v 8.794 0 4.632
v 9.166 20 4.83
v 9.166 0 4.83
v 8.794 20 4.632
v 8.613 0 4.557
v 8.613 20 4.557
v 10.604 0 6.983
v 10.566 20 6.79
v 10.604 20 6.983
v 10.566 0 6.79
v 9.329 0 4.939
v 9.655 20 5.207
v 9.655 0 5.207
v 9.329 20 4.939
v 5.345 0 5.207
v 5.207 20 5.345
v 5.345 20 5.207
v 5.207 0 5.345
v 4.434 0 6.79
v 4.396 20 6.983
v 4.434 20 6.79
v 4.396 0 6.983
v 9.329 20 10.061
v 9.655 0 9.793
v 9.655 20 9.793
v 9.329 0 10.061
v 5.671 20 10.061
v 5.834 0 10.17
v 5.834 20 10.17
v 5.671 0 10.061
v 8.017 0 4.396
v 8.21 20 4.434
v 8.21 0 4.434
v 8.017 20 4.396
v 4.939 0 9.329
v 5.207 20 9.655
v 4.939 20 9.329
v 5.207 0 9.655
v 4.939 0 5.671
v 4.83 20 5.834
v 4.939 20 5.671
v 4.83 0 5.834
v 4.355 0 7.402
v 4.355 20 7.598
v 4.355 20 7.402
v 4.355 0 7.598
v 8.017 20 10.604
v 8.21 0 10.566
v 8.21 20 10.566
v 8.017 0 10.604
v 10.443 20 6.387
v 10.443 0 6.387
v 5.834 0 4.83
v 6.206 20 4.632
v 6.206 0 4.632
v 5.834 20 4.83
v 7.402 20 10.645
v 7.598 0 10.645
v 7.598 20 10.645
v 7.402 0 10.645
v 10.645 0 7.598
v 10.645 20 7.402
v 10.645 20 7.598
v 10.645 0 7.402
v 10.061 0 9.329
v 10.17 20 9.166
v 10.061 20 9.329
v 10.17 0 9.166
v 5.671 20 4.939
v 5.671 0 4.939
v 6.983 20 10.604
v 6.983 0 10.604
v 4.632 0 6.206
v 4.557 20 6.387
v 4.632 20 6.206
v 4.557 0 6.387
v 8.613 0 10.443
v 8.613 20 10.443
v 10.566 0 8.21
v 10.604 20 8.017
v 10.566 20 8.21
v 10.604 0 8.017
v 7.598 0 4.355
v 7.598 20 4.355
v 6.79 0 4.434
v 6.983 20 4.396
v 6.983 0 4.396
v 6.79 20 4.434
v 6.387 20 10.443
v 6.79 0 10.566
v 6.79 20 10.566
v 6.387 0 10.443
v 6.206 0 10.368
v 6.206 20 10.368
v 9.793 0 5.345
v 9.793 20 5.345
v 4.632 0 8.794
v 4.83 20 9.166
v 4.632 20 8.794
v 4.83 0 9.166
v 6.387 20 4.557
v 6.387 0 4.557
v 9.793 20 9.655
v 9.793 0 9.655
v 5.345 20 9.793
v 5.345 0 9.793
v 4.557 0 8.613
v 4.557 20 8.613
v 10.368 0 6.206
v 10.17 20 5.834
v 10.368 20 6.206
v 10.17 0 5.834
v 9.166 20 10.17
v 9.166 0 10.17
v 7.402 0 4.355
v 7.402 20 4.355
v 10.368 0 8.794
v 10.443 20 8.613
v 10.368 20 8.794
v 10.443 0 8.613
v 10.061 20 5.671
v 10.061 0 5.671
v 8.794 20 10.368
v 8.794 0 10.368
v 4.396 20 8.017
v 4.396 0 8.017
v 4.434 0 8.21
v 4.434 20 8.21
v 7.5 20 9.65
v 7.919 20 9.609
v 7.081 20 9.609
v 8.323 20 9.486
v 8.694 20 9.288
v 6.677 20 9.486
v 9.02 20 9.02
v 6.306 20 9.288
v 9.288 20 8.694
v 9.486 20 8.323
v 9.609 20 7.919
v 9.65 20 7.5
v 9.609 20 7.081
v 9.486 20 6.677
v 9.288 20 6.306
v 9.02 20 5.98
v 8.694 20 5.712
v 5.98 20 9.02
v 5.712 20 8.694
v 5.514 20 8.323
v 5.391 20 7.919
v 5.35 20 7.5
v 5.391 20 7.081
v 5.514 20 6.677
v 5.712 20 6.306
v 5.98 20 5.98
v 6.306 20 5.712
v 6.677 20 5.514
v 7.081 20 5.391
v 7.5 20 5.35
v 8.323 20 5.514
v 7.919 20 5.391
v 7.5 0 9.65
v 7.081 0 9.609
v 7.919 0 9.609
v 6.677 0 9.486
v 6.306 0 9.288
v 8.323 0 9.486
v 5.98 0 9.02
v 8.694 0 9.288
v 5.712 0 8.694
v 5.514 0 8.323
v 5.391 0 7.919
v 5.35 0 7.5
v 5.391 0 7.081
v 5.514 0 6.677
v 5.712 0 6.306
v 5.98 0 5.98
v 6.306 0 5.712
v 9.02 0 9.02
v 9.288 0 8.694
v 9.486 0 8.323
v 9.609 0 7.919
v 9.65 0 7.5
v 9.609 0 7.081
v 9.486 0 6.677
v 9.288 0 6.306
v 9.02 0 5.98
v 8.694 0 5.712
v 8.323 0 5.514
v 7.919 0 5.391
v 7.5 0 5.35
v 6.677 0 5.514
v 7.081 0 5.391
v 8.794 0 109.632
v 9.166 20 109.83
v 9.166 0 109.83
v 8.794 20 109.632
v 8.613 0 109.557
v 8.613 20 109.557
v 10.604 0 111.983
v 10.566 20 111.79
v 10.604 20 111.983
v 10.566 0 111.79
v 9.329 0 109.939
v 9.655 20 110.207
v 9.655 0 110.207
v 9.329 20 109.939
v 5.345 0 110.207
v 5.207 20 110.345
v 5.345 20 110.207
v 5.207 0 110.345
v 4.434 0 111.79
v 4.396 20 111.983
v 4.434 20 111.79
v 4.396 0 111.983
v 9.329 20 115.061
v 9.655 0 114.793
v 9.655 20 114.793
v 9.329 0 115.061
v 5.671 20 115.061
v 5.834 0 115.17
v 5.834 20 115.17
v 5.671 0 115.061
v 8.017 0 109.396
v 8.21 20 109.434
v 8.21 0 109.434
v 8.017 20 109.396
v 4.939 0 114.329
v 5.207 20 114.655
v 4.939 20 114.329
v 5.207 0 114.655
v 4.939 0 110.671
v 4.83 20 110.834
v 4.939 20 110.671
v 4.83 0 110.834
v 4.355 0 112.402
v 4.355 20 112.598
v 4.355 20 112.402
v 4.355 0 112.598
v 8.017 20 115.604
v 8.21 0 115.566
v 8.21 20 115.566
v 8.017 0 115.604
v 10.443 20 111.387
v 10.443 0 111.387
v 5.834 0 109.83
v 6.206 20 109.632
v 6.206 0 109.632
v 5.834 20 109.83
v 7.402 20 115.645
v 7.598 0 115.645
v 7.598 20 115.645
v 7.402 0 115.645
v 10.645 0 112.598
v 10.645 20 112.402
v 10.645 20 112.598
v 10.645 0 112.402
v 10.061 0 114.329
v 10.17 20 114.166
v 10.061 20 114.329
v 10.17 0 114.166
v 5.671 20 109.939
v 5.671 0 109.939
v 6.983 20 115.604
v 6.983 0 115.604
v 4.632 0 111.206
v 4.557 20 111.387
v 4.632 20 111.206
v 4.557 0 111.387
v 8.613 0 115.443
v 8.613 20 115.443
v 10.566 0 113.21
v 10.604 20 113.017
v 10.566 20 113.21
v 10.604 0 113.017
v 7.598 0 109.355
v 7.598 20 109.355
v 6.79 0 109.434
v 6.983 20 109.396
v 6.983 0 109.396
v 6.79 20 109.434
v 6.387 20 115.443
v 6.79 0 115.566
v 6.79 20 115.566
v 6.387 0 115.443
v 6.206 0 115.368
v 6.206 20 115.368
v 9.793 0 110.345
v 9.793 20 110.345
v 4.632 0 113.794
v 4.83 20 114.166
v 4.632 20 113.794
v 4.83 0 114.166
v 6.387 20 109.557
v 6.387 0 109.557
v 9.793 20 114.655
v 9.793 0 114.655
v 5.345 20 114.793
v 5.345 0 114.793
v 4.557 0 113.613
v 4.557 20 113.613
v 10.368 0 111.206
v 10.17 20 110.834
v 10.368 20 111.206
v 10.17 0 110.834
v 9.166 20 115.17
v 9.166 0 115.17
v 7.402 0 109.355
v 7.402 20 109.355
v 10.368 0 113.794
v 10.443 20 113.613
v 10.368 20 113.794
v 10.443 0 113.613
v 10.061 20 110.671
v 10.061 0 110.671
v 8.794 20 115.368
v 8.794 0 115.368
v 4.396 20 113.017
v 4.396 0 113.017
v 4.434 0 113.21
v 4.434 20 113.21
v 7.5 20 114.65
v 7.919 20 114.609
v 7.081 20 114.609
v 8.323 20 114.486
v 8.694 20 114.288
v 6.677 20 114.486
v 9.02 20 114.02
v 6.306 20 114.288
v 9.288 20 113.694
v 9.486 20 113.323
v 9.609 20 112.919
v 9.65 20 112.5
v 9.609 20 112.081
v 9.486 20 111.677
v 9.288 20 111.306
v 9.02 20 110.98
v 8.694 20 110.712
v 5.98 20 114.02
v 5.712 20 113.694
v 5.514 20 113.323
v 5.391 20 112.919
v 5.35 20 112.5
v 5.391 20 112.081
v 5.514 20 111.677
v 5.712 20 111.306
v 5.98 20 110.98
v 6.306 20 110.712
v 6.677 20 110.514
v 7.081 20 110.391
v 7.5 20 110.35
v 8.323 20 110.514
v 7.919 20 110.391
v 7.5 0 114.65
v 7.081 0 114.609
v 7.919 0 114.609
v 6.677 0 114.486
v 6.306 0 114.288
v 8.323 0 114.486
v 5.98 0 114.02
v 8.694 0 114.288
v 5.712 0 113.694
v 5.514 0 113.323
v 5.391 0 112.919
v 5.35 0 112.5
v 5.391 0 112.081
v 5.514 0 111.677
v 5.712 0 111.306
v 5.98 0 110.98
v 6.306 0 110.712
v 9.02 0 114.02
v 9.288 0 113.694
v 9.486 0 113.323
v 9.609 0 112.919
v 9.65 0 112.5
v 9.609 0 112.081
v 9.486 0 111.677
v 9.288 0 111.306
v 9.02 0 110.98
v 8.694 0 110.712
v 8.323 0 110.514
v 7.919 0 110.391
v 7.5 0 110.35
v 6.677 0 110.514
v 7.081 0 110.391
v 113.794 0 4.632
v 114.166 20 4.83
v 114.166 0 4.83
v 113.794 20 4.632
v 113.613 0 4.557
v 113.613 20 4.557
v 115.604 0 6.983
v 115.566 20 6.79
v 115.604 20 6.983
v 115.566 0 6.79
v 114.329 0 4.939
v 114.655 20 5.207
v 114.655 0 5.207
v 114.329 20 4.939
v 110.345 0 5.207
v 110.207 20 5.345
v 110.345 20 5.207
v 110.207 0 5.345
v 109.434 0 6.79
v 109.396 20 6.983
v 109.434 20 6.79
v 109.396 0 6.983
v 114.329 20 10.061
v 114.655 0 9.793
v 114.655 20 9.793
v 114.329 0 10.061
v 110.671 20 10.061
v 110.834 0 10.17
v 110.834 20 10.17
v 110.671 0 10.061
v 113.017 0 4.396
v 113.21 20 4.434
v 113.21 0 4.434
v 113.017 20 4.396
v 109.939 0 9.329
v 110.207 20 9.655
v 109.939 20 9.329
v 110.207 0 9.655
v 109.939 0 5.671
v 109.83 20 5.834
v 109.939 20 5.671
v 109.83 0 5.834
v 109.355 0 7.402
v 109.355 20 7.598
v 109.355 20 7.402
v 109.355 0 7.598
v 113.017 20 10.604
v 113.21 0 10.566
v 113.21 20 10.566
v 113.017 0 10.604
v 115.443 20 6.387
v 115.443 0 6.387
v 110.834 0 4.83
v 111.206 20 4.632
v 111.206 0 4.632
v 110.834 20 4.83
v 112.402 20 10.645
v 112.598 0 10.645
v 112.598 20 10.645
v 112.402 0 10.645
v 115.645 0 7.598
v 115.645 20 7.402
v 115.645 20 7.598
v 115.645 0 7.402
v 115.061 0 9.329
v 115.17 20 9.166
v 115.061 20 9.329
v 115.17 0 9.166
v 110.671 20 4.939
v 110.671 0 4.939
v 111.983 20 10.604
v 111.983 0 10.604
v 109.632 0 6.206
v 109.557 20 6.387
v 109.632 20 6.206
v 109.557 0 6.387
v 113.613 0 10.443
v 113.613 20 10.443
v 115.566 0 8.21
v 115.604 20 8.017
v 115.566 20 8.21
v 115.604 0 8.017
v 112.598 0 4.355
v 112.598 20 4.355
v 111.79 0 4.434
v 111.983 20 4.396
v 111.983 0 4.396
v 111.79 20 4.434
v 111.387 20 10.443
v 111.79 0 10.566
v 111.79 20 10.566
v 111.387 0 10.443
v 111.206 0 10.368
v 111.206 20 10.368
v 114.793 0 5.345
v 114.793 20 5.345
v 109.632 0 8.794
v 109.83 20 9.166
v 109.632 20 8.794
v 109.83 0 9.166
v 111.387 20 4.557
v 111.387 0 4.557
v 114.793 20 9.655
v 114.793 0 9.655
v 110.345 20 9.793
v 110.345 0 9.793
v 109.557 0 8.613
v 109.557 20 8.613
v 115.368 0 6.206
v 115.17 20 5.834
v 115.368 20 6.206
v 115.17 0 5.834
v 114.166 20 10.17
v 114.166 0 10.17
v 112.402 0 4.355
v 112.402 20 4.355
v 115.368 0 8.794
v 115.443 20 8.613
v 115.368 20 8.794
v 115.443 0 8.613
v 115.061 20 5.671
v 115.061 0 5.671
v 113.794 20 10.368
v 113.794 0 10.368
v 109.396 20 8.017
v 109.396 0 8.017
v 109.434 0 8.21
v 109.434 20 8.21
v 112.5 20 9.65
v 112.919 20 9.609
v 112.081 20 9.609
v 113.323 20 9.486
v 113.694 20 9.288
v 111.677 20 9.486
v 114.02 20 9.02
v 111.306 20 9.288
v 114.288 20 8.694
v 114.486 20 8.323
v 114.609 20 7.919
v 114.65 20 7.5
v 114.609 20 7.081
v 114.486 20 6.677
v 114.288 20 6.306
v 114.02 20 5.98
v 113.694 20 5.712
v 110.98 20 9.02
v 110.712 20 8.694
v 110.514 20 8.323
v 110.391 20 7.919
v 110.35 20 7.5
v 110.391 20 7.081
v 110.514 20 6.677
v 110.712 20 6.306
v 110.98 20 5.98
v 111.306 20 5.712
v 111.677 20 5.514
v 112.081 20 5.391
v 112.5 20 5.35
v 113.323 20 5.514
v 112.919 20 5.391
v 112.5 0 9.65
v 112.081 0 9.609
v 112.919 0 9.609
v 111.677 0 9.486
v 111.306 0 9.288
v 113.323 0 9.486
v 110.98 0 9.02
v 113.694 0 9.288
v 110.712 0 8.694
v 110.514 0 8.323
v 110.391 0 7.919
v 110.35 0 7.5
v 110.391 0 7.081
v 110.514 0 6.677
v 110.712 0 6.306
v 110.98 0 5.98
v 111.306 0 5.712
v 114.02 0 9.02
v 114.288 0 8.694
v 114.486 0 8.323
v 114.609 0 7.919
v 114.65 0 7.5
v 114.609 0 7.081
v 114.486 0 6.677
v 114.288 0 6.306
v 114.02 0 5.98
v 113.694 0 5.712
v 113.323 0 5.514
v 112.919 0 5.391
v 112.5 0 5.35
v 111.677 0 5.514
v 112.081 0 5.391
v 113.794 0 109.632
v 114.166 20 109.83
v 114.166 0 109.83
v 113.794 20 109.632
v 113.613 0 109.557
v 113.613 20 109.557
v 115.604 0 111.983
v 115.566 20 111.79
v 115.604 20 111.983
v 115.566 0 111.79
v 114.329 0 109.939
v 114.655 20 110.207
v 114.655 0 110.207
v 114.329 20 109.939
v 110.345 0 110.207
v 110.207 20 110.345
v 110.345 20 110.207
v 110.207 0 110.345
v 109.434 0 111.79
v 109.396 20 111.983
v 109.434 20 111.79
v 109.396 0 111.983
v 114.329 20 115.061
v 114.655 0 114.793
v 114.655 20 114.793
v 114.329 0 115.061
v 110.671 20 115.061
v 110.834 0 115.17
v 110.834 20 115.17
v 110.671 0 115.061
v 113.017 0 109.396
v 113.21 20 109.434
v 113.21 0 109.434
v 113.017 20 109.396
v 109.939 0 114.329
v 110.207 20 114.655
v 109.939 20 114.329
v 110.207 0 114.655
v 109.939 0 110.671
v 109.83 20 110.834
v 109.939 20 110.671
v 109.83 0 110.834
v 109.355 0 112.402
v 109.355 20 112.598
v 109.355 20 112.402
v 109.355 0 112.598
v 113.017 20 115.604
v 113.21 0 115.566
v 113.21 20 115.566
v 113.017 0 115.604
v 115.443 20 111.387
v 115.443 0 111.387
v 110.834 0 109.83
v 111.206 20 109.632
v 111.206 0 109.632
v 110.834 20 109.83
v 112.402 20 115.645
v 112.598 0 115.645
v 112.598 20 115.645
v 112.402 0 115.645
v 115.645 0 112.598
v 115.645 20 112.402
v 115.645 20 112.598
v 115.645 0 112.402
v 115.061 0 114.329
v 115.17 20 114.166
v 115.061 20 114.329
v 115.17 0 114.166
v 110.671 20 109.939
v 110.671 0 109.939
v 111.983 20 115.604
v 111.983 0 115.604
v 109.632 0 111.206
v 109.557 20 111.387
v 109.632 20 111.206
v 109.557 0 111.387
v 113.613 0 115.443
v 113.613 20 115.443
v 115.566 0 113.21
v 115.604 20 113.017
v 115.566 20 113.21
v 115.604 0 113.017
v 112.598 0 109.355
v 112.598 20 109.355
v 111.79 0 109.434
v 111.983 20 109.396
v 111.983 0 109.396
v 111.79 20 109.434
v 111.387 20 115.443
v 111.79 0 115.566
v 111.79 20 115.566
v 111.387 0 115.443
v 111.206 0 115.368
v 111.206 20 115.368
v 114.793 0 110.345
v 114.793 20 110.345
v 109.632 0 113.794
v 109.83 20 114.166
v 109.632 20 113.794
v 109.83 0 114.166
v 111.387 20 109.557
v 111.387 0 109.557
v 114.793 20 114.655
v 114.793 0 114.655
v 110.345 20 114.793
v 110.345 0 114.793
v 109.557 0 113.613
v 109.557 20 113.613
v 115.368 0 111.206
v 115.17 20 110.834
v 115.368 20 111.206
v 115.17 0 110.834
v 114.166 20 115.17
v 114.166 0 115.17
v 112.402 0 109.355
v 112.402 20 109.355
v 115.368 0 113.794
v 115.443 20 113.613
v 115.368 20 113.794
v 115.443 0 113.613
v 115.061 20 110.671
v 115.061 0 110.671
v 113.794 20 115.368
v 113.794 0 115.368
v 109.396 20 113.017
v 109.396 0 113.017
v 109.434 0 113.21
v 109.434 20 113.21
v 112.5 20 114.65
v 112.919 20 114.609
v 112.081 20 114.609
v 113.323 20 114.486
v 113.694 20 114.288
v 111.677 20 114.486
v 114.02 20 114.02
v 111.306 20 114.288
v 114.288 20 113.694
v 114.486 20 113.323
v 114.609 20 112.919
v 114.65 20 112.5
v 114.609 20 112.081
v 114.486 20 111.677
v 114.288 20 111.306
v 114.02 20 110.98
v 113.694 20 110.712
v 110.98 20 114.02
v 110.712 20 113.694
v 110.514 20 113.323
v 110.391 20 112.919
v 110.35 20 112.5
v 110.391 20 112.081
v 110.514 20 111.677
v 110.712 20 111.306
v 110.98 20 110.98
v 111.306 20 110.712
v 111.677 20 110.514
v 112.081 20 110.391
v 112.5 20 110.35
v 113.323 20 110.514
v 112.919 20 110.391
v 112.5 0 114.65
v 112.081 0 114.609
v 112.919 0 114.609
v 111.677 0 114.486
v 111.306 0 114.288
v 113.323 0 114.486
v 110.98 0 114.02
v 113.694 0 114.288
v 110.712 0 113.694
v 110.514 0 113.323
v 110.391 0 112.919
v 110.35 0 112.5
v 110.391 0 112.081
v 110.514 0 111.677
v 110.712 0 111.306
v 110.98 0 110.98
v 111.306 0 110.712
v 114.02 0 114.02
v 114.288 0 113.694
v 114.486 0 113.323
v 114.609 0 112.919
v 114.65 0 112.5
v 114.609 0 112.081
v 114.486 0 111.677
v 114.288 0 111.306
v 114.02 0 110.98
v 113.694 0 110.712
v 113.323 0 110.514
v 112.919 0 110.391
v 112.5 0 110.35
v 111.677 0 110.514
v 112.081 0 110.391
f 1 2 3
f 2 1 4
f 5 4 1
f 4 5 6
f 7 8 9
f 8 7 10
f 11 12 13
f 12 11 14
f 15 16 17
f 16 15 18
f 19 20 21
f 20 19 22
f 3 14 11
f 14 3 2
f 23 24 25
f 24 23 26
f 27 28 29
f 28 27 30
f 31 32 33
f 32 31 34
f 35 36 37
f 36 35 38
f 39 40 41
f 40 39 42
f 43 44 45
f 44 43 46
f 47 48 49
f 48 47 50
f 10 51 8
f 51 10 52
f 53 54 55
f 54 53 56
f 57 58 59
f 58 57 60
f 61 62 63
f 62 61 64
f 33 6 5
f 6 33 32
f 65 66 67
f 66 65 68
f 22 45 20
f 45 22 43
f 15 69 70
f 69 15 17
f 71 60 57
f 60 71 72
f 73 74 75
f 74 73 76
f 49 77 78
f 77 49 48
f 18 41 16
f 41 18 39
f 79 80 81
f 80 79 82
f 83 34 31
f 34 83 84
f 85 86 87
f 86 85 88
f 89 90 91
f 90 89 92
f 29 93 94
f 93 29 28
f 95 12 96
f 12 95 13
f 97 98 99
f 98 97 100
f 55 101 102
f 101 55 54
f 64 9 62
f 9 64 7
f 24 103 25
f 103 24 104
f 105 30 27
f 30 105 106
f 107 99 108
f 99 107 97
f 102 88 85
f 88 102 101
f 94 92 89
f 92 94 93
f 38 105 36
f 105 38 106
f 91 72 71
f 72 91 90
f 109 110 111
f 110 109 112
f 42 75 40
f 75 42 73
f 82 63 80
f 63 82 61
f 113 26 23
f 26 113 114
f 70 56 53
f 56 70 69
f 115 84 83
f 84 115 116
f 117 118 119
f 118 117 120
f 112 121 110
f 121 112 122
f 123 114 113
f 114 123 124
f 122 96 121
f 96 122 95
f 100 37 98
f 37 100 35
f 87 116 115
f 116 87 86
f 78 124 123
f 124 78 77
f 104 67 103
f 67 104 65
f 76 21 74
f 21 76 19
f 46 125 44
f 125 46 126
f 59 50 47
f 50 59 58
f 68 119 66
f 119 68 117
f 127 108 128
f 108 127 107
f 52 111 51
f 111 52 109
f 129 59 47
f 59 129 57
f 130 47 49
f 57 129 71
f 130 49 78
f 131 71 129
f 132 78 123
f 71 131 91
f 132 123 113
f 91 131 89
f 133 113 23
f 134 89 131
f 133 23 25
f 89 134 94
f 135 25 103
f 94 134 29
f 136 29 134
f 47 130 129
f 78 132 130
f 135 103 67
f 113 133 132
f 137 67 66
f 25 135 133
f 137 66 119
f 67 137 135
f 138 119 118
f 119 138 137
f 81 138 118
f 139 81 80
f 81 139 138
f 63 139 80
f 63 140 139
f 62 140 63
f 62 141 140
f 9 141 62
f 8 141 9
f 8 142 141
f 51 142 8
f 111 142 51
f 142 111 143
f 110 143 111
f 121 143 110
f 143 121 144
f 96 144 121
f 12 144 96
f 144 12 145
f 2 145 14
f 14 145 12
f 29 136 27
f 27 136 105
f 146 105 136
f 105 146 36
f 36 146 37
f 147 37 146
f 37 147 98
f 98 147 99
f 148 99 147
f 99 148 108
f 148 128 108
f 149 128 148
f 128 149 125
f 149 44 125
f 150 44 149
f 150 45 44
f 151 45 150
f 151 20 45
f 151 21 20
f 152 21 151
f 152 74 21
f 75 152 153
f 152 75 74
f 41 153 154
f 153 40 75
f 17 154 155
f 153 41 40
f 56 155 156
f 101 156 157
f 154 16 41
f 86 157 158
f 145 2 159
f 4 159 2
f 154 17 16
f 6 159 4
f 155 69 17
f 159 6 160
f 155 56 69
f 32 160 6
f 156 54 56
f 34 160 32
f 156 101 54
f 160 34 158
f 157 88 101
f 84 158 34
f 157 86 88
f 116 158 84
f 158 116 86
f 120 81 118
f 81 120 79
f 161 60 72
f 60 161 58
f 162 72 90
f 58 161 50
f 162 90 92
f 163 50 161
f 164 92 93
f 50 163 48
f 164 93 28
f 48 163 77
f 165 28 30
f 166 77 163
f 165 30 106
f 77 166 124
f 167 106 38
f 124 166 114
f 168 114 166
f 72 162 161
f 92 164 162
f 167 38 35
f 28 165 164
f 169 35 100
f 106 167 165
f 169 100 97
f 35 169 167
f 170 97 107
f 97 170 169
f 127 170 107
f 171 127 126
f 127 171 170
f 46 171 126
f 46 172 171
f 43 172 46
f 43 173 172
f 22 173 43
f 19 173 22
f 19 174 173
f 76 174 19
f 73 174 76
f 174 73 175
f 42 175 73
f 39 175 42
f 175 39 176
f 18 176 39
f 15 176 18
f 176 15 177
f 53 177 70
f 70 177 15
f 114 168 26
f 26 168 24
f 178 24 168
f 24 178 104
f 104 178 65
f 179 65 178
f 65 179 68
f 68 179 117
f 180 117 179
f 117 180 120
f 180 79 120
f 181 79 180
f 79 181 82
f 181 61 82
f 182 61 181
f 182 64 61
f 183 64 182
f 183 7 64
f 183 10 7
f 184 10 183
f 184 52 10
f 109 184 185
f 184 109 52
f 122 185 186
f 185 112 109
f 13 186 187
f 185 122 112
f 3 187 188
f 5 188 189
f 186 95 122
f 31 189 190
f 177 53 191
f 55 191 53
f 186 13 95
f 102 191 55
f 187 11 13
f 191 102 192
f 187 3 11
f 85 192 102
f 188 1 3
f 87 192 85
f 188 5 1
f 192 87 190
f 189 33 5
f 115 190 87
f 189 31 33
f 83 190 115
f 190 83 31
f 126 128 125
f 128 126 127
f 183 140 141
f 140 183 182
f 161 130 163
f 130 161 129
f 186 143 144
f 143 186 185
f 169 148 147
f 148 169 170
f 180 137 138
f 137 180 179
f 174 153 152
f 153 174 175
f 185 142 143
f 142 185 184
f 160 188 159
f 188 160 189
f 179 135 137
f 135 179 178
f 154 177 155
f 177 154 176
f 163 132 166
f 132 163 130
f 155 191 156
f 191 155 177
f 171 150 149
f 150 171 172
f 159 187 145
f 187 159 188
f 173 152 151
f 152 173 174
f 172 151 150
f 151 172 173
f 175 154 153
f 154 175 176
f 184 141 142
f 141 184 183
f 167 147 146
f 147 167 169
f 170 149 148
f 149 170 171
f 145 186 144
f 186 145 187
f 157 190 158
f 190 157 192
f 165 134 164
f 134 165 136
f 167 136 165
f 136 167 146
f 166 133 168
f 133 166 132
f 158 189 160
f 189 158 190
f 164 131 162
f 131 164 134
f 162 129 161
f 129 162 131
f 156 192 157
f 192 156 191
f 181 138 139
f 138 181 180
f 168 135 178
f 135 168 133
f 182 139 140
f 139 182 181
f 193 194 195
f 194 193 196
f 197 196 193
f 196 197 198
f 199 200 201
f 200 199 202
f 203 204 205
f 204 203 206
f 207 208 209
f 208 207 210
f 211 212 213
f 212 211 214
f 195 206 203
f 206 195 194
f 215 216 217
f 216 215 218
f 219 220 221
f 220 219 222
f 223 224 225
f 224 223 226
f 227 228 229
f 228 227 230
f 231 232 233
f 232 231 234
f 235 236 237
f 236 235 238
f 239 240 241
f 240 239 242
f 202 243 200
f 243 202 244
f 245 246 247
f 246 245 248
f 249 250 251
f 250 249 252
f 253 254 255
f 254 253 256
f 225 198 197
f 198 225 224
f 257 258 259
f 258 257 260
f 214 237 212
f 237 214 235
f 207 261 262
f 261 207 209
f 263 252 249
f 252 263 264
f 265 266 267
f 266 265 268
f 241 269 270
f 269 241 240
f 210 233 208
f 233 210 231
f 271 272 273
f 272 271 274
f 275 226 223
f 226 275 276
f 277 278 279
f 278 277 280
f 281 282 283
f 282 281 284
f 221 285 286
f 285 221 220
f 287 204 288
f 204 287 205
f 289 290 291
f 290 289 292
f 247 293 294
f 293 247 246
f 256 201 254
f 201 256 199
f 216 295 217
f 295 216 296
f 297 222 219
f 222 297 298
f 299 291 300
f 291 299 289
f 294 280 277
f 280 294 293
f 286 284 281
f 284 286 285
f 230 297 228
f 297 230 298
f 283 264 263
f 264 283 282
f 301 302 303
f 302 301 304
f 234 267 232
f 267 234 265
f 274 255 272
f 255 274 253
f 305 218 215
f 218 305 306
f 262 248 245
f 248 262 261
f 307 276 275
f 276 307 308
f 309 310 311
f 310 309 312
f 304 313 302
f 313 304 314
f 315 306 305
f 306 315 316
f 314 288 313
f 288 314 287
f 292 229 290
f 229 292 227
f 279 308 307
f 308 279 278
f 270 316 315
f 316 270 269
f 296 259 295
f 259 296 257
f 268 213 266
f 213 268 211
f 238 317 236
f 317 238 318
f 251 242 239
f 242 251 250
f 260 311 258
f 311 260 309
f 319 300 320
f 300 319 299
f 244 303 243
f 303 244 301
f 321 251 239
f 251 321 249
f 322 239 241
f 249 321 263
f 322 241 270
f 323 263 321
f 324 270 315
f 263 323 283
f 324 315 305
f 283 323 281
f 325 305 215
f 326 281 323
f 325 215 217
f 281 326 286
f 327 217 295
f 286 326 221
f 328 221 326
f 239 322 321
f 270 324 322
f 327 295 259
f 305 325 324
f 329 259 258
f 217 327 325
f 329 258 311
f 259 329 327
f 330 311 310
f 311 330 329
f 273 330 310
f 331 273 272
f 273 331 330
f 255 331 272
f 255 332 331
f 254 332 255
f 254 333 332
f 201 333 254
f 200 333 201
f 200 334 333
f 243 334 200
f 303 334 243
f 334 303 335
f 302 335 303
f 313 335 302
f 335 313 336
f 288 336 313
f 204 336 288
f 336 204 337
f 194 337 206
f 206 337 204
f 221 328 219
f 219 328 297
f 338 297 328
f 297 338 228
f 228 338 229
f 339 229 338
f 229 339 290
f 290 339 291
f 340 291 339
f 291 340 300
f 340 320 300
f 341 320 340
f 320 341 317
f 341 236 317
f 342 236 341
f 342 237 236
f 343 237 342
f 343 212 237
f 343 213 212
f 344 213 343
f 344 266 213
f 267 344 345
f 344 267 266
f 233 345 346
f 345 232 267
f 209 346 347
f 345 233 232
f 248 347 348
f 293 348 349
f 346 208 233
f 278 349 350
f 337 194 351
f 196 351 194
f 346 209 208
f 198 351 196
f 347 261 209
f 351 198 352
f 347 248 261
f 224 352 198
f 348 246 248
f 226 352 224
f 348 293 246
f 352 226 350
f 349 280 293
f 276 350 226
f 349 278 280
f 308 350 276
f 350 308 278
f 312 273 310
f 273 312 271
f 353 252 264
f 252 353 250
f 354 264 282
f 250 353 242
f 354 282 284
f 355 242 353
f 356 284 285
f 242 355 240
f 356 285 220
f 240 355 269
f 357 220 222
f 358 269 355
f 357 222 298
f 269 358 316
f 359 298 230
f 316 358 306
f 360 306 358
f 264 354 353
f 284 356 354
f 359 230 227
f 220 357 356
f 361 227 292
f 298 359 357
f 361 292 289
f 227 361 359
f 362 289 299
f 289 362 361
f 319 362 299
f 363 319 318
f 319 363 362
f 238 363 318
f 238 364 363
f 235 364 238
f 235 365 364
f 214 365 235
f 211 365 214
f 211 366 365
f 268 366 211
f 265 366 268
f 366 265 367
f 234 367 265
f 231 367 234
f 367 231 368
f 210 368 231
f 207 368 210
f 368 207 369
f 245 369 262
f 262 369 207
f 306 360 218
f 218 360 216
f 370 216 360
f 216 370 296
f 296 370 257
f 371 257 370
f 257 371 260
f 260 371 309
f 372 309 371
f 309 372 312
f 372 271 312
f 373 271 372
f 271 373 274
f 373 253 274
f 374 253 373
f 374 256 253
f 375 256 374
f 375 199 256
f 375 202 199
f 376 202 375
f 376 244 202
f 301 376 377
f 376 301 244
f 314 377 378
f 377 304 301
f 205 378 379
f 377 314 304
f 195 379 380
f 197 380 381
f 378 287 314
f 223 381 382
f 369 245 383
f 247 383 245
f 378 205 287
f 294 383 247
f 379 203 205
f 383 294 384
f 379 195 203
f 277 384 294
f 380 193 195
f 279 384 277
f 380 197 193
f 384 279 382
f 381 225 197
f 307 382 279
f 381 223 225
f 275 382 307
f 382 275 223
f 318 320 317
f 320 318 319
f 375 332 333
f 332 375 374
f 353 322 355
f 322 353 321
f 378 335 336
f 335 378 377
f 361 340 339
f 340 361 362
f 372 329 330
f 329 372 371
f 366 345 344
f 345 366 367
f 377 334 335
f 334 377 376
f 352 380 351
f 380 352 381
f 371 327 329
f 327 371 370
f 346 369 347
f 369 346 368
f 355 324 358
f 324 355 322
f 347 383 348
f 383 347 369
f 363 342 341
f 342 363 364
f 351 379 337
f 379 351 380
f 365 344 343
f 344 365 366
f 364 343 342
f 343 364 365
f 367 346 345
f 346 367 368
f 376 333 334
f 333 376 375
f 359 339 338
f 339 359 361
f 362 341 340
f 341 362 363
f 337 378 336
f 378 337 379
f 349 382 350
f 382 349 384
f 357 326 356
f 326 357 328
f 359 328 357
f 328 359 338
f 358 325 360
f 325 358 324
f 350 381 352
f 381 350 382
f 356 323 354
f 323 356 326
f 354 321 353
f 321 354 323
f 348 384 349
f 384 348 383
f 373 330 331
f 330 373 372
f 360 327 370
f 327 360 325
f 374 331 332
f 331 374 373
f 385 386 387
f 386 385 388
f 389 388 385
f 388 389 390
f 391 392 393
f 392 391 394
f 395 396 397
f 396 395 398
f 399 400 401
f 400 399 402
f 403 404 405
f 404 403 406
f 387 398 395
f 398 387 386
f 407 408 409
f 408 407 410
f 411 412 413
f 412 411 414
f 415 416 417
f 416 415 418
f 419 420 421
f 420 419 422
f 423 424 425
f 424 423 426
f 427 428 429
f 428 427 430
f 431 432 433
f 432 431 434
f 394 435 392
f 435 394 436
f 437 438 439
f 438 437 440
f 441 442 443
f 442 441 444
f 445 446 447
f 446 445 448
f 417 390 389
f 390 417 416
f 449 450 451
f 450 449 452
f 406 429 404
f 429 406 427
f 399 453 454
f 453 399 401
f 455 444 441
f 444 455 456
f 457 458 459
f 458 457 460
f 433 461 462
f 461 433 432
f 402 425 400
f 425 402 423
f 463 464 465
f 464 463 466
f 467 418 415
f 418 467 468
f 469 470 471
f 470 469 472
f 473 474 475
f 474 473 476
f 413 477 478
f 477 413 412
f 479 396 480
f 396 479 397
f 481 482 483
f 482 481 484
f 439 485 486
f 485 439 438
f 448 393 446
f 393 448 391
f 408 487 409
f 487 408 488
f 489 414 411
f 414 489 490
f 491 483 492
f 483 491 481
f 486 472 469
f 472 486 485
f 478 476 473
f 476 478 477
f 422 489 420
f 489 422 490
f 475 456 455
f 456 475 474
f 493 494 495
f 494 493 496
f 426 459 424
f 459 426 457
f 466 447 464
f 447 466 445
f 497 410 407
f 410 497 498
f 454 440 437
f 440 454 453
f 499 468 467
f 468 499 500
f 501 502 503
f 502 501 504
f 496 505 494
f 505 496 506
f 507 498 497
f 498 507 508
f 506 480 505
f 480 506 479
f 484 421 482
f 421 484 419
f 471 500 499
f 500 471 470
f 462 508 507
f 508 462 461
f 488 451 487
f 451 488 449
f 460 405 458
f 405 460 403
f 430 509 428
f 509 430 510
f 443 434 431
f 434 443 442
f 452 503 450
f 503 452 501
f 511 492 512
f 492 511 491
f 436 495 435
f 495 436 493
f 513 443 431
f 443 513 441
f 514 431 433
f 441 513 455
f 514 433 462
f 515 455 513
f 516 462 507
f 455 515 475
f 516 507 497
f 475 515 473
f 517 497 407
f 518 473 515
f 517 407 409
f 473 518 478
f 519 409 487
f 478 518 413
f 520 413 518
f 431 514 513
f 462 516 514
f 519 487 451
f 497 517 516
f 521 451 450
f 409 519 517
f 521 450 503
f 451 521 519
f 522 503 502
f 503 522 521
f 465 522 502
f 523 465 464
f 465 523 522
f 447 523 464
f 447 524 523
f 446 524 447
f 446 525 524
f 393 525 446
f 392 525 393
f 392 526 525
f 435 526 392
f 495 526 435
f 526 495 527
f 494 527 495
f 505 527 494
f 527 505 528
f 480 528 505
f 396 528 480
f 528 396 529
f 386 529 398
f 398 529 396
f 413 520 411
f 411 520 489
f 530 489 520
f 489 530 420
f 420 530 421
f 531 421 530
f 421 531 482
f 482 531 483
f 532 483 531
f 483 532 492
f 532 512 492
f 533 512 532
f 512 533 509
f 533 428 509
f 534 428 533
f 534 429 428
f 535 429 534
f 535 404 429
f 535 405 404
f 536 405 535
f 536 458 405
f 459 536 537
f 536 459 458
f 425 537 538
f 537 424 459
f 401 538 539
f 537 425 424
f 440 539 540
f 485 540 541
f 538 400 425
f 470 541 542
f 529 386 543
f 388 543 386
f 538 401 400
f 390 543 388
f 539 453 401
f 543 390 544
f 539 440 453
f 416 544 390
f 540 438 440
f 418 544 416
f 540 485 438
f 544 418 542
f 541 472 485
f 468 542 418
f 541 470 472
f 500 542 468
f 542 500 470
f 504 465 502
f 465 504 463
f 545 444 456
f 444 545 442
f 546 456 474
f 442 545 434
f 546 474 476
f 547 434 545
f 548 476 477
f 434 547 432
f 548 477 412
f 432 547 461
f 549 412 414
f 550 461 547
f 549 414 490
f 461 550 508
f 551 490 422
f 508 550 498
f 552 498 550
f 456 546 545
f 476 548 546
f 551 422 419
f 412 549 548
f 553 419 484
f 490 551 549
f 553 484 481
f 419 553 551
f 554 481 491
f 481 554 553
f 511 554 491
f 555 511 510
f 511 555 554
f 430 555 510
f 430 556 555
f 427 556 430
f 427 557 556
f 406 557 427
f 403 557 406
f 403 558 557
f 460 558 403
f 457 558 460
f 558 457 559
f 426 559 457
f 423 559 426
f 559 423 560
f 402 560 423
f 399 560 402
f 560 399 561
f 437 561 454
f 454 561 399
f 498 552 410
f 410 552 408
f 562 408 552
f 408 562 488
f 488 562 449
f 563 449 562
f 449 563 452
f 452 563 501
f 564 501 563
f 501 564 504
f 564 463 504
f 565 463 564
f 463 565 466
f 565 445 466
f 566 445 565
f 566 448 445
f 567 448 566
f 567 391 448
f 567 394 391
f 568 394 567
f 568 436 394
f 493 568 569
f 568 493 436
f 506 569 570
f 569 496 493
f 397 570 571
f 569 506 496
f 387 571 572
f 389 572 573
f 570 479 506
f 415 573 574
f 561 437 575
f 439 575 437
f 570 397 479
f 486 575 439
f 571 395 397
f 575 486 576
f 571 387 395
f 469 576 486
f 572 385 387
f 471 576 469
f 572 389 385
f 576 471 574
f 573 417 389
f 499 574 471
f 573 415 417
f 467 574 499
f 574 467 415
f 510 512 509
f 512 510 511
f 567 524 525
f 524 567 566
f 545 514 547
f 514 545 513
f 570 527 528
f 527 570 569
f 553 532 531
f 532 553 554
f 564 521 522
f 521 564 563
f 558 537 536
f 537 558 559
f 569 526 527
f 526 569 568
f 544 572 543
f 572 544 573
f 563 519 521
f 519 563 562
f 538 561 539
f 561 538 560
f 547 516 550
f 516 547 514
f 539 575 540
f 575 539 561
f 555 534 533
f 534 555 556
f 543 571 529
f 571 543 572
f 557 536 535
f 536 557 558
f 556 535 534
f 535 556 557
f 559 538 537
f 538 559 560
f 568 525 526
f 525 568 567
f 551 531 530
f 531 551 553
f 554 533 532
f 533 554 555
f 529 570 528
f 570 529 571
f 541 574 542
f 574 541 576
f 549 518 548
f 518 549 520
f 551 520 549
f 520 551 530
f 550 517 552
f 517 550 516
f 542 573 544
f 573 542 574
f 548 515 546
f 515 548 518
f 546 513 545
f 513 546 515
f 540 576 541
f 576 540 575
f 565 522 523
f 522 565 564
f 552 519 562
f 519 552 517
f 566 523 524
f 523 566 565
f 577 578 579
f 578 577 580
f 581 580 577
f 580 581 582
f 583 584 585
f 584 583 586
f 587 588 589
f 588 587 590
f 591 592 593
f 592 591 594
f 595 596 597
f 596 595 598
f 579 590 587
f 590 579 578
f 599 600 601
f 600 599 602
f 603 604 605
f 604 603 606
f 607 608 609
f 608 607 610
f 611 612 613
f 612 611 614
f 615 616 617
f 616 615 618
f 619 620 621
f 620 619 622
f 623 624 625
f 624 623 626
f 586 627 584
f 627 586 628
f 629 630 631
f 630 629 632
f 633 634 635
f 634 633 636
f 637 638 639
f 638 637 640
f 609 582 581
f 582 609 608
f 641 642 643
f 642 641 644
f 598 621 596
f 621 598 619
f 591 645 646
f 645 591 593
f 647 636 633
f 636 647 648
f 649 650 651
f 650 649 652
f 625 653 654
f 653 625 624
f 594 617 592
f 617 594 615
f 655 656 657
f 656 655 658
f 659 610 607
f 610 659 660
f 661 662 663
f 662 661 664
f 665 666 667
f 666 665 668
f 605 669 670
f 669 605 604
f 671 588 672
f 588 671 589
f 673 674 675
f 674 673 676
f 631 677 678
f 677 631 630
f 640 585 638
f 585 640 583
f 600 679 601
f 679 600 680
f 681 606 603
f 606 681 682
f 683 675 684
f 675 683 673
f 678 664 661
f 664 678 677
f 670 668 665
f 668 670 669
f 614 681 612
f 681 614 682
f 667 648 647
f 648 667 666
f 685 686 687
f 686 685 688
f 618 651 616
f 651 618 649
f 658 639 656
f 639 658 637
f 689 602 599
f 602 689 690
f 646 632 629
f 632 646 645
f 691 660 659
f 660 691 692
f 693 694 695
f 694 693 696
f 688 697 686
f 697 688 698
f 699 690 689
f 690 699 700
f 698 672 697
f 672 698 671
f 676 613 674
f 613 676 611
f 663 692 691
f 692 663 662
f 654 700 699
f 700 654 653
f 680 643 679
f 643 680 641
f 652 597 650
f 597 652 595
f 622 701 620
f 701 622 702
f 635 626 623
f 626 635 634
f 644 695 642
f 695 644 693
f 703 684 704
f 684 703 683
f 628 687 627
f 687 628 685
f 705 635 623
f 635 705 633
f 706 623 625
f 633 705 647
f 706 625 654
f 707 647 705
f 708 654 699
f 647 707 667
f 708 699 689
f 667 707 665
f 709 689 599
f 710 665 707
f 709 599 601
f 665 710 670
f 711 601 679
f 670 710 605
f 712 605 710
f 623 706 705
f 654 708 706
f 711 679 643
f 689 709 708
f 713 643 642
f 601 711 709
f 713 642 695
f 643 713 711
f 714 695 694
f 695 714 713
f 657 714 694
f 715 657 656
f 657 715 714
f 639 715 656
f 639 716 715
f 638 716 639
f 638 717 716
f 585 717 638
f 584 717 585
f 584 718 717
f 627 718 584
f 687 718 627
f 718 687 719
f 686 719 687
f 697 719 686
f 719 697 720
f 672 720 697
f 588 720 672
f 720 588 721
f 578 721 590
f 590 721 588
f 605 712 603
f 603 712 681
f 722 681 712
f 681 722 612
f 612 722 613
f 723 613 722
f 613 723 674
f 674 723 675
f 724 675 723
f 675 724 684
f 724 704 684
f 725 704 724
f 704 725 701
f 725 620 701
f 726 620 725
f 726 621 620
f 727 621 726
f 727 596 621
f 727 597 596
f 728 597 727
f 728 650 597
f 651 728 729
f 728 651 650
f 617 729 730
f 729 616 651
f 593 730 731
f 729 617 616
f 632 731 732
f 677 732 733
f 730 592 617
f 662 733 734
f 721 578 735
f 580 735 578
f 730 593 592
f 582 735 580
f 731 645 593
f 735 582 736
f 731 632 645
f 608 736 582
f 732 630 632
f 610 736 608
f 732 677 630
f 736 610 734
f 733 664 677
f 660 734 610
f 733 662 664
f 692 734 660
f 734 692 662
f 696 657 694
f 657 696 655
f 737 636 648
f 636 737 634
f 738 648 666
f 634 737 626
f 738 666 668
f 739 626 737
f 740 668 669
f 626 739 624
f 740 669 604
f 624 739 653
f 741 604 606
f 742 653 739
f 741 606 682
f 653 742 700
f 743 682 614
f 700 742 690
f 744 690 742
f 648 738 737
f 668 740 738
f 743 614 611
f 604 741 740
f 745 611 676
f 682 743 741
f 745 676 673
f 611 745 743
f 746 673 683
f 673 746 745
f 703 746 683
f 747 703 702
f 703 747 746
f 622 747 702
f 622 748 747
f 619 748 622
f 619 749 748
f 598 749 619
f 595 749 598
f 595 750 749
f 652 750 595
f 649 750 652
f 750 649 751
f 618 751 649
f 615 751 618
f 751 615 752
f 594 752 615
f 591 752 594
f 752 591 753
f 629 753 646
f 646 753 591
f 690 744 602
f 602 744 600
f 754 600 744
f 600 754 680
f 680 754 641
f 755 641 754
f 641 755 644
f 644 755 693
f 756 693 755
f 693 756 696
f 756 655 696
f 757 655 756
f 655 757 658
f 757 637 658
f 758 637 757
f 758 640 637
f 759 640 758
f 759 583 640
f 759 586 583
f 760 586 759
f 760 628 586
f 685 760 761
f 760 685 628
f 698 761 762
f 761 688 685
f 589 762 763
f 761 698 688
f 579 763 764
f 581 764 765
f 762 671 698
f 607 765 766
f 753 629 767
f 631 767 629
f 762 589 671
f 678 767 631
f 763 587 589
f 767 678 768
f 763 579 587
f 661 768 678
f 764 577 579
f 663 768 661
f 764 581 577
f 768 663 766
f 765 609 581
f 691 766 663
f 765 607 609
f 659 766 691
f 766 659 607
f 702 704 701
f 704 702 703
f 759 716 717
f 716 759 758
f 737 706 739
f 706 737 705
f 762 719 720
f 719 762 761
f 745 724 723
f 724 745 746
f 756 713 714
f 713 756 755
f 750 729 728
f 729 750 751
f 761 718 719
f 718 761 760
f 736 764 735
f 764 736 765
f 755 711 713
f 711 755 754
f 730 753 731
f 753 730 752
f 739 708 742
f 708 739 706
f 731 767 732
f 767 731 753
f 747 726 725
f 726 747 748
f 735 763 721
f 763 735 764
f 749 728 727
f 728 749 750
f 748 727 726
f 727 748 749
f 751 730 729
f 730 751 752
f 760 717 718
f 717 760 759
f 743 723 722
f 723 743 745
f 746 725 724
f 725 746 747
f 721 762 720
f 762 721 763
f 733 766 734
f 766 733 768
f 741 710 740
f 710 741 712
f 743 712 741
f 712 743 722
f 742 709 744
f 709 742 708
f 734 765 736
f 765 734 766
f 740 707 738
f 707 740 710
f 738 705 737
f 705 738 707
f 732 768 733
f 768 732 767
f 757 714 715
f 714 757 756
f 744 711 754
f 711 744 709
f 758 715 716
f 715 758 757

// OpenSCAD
// Chassis fan mounting hole size
FAN_MOUNTING_HOLE_DIAMETER = 4.3;
FAN_DEPTH = 25;

draw_fan_mounting_holes_offset(120,20);

// TODO: support other fan sizes and depths
function get_fan_spacing(size) =
    (size == 140) ?
        125 :
    (size == 120) ?
        105 :
    (size == 92) ?
        82.5 :
    (size == 80) ?
        71.5 :
    (size == 70) ?
        60 :
    (size == 60) ?
        50 :
    (size == 50) ?
        40 :
    (size == 40) ?
        32 :
    0;
             

module draw_fan(diameter, size, depth)
{
    difference()
    {
        cube([size, depth, size]);
        draw_fan_mounting_holes(size, depth);
        draw_fan_through_hole(diameter, size, depth);
    }
}

module draw_fan_mounting_holes(size, depth)
{
    spacing = get_fan_spacing(size);
    offset = (size-spacing)/2;
    
    for(x = [offset, offset+spacing])
    {
        for(z = [offset, offset+spacing])
        {
            translate([x, (depth+2)/2-1, z]) rotate([90,0,0]) cylinder(h=depth+2,d=FAN_MOUNTING_HOLE_DIAMETER,center=true, $fn=32);
        }
    }
}

module draw_fan_mounting_holes_offset(size, depth, radius)
{
    spacing = get_fan_spacing(size);
    offset = (size-spacing)/2;
    
    for(x = [offset, offset+spacing])
    {
        for(z = [offset, offset+spacing])
        {
            translate([x, depth, z]) rotate([90,0,0])  difference(){linear_extrude(depth) offset(r=radius){circle(d=FAN_MOUNTING_HOLE_DIAMETER, $fn=32);} translate([0,0,-0.5])linear_extrude(depth+1) circle(d=FAN_MOUNTING_HOLE_DIAMETER, $fn=32);}
        }
    }
}

module draw_fan_through_hole(diameter, size, depth)
{
    translate([size/2,(depth+2)/2-1,size/2]) rotate([90,0,0]) cylinder(h=depth+2,d=diameter,center=true, $fn=32);
}
